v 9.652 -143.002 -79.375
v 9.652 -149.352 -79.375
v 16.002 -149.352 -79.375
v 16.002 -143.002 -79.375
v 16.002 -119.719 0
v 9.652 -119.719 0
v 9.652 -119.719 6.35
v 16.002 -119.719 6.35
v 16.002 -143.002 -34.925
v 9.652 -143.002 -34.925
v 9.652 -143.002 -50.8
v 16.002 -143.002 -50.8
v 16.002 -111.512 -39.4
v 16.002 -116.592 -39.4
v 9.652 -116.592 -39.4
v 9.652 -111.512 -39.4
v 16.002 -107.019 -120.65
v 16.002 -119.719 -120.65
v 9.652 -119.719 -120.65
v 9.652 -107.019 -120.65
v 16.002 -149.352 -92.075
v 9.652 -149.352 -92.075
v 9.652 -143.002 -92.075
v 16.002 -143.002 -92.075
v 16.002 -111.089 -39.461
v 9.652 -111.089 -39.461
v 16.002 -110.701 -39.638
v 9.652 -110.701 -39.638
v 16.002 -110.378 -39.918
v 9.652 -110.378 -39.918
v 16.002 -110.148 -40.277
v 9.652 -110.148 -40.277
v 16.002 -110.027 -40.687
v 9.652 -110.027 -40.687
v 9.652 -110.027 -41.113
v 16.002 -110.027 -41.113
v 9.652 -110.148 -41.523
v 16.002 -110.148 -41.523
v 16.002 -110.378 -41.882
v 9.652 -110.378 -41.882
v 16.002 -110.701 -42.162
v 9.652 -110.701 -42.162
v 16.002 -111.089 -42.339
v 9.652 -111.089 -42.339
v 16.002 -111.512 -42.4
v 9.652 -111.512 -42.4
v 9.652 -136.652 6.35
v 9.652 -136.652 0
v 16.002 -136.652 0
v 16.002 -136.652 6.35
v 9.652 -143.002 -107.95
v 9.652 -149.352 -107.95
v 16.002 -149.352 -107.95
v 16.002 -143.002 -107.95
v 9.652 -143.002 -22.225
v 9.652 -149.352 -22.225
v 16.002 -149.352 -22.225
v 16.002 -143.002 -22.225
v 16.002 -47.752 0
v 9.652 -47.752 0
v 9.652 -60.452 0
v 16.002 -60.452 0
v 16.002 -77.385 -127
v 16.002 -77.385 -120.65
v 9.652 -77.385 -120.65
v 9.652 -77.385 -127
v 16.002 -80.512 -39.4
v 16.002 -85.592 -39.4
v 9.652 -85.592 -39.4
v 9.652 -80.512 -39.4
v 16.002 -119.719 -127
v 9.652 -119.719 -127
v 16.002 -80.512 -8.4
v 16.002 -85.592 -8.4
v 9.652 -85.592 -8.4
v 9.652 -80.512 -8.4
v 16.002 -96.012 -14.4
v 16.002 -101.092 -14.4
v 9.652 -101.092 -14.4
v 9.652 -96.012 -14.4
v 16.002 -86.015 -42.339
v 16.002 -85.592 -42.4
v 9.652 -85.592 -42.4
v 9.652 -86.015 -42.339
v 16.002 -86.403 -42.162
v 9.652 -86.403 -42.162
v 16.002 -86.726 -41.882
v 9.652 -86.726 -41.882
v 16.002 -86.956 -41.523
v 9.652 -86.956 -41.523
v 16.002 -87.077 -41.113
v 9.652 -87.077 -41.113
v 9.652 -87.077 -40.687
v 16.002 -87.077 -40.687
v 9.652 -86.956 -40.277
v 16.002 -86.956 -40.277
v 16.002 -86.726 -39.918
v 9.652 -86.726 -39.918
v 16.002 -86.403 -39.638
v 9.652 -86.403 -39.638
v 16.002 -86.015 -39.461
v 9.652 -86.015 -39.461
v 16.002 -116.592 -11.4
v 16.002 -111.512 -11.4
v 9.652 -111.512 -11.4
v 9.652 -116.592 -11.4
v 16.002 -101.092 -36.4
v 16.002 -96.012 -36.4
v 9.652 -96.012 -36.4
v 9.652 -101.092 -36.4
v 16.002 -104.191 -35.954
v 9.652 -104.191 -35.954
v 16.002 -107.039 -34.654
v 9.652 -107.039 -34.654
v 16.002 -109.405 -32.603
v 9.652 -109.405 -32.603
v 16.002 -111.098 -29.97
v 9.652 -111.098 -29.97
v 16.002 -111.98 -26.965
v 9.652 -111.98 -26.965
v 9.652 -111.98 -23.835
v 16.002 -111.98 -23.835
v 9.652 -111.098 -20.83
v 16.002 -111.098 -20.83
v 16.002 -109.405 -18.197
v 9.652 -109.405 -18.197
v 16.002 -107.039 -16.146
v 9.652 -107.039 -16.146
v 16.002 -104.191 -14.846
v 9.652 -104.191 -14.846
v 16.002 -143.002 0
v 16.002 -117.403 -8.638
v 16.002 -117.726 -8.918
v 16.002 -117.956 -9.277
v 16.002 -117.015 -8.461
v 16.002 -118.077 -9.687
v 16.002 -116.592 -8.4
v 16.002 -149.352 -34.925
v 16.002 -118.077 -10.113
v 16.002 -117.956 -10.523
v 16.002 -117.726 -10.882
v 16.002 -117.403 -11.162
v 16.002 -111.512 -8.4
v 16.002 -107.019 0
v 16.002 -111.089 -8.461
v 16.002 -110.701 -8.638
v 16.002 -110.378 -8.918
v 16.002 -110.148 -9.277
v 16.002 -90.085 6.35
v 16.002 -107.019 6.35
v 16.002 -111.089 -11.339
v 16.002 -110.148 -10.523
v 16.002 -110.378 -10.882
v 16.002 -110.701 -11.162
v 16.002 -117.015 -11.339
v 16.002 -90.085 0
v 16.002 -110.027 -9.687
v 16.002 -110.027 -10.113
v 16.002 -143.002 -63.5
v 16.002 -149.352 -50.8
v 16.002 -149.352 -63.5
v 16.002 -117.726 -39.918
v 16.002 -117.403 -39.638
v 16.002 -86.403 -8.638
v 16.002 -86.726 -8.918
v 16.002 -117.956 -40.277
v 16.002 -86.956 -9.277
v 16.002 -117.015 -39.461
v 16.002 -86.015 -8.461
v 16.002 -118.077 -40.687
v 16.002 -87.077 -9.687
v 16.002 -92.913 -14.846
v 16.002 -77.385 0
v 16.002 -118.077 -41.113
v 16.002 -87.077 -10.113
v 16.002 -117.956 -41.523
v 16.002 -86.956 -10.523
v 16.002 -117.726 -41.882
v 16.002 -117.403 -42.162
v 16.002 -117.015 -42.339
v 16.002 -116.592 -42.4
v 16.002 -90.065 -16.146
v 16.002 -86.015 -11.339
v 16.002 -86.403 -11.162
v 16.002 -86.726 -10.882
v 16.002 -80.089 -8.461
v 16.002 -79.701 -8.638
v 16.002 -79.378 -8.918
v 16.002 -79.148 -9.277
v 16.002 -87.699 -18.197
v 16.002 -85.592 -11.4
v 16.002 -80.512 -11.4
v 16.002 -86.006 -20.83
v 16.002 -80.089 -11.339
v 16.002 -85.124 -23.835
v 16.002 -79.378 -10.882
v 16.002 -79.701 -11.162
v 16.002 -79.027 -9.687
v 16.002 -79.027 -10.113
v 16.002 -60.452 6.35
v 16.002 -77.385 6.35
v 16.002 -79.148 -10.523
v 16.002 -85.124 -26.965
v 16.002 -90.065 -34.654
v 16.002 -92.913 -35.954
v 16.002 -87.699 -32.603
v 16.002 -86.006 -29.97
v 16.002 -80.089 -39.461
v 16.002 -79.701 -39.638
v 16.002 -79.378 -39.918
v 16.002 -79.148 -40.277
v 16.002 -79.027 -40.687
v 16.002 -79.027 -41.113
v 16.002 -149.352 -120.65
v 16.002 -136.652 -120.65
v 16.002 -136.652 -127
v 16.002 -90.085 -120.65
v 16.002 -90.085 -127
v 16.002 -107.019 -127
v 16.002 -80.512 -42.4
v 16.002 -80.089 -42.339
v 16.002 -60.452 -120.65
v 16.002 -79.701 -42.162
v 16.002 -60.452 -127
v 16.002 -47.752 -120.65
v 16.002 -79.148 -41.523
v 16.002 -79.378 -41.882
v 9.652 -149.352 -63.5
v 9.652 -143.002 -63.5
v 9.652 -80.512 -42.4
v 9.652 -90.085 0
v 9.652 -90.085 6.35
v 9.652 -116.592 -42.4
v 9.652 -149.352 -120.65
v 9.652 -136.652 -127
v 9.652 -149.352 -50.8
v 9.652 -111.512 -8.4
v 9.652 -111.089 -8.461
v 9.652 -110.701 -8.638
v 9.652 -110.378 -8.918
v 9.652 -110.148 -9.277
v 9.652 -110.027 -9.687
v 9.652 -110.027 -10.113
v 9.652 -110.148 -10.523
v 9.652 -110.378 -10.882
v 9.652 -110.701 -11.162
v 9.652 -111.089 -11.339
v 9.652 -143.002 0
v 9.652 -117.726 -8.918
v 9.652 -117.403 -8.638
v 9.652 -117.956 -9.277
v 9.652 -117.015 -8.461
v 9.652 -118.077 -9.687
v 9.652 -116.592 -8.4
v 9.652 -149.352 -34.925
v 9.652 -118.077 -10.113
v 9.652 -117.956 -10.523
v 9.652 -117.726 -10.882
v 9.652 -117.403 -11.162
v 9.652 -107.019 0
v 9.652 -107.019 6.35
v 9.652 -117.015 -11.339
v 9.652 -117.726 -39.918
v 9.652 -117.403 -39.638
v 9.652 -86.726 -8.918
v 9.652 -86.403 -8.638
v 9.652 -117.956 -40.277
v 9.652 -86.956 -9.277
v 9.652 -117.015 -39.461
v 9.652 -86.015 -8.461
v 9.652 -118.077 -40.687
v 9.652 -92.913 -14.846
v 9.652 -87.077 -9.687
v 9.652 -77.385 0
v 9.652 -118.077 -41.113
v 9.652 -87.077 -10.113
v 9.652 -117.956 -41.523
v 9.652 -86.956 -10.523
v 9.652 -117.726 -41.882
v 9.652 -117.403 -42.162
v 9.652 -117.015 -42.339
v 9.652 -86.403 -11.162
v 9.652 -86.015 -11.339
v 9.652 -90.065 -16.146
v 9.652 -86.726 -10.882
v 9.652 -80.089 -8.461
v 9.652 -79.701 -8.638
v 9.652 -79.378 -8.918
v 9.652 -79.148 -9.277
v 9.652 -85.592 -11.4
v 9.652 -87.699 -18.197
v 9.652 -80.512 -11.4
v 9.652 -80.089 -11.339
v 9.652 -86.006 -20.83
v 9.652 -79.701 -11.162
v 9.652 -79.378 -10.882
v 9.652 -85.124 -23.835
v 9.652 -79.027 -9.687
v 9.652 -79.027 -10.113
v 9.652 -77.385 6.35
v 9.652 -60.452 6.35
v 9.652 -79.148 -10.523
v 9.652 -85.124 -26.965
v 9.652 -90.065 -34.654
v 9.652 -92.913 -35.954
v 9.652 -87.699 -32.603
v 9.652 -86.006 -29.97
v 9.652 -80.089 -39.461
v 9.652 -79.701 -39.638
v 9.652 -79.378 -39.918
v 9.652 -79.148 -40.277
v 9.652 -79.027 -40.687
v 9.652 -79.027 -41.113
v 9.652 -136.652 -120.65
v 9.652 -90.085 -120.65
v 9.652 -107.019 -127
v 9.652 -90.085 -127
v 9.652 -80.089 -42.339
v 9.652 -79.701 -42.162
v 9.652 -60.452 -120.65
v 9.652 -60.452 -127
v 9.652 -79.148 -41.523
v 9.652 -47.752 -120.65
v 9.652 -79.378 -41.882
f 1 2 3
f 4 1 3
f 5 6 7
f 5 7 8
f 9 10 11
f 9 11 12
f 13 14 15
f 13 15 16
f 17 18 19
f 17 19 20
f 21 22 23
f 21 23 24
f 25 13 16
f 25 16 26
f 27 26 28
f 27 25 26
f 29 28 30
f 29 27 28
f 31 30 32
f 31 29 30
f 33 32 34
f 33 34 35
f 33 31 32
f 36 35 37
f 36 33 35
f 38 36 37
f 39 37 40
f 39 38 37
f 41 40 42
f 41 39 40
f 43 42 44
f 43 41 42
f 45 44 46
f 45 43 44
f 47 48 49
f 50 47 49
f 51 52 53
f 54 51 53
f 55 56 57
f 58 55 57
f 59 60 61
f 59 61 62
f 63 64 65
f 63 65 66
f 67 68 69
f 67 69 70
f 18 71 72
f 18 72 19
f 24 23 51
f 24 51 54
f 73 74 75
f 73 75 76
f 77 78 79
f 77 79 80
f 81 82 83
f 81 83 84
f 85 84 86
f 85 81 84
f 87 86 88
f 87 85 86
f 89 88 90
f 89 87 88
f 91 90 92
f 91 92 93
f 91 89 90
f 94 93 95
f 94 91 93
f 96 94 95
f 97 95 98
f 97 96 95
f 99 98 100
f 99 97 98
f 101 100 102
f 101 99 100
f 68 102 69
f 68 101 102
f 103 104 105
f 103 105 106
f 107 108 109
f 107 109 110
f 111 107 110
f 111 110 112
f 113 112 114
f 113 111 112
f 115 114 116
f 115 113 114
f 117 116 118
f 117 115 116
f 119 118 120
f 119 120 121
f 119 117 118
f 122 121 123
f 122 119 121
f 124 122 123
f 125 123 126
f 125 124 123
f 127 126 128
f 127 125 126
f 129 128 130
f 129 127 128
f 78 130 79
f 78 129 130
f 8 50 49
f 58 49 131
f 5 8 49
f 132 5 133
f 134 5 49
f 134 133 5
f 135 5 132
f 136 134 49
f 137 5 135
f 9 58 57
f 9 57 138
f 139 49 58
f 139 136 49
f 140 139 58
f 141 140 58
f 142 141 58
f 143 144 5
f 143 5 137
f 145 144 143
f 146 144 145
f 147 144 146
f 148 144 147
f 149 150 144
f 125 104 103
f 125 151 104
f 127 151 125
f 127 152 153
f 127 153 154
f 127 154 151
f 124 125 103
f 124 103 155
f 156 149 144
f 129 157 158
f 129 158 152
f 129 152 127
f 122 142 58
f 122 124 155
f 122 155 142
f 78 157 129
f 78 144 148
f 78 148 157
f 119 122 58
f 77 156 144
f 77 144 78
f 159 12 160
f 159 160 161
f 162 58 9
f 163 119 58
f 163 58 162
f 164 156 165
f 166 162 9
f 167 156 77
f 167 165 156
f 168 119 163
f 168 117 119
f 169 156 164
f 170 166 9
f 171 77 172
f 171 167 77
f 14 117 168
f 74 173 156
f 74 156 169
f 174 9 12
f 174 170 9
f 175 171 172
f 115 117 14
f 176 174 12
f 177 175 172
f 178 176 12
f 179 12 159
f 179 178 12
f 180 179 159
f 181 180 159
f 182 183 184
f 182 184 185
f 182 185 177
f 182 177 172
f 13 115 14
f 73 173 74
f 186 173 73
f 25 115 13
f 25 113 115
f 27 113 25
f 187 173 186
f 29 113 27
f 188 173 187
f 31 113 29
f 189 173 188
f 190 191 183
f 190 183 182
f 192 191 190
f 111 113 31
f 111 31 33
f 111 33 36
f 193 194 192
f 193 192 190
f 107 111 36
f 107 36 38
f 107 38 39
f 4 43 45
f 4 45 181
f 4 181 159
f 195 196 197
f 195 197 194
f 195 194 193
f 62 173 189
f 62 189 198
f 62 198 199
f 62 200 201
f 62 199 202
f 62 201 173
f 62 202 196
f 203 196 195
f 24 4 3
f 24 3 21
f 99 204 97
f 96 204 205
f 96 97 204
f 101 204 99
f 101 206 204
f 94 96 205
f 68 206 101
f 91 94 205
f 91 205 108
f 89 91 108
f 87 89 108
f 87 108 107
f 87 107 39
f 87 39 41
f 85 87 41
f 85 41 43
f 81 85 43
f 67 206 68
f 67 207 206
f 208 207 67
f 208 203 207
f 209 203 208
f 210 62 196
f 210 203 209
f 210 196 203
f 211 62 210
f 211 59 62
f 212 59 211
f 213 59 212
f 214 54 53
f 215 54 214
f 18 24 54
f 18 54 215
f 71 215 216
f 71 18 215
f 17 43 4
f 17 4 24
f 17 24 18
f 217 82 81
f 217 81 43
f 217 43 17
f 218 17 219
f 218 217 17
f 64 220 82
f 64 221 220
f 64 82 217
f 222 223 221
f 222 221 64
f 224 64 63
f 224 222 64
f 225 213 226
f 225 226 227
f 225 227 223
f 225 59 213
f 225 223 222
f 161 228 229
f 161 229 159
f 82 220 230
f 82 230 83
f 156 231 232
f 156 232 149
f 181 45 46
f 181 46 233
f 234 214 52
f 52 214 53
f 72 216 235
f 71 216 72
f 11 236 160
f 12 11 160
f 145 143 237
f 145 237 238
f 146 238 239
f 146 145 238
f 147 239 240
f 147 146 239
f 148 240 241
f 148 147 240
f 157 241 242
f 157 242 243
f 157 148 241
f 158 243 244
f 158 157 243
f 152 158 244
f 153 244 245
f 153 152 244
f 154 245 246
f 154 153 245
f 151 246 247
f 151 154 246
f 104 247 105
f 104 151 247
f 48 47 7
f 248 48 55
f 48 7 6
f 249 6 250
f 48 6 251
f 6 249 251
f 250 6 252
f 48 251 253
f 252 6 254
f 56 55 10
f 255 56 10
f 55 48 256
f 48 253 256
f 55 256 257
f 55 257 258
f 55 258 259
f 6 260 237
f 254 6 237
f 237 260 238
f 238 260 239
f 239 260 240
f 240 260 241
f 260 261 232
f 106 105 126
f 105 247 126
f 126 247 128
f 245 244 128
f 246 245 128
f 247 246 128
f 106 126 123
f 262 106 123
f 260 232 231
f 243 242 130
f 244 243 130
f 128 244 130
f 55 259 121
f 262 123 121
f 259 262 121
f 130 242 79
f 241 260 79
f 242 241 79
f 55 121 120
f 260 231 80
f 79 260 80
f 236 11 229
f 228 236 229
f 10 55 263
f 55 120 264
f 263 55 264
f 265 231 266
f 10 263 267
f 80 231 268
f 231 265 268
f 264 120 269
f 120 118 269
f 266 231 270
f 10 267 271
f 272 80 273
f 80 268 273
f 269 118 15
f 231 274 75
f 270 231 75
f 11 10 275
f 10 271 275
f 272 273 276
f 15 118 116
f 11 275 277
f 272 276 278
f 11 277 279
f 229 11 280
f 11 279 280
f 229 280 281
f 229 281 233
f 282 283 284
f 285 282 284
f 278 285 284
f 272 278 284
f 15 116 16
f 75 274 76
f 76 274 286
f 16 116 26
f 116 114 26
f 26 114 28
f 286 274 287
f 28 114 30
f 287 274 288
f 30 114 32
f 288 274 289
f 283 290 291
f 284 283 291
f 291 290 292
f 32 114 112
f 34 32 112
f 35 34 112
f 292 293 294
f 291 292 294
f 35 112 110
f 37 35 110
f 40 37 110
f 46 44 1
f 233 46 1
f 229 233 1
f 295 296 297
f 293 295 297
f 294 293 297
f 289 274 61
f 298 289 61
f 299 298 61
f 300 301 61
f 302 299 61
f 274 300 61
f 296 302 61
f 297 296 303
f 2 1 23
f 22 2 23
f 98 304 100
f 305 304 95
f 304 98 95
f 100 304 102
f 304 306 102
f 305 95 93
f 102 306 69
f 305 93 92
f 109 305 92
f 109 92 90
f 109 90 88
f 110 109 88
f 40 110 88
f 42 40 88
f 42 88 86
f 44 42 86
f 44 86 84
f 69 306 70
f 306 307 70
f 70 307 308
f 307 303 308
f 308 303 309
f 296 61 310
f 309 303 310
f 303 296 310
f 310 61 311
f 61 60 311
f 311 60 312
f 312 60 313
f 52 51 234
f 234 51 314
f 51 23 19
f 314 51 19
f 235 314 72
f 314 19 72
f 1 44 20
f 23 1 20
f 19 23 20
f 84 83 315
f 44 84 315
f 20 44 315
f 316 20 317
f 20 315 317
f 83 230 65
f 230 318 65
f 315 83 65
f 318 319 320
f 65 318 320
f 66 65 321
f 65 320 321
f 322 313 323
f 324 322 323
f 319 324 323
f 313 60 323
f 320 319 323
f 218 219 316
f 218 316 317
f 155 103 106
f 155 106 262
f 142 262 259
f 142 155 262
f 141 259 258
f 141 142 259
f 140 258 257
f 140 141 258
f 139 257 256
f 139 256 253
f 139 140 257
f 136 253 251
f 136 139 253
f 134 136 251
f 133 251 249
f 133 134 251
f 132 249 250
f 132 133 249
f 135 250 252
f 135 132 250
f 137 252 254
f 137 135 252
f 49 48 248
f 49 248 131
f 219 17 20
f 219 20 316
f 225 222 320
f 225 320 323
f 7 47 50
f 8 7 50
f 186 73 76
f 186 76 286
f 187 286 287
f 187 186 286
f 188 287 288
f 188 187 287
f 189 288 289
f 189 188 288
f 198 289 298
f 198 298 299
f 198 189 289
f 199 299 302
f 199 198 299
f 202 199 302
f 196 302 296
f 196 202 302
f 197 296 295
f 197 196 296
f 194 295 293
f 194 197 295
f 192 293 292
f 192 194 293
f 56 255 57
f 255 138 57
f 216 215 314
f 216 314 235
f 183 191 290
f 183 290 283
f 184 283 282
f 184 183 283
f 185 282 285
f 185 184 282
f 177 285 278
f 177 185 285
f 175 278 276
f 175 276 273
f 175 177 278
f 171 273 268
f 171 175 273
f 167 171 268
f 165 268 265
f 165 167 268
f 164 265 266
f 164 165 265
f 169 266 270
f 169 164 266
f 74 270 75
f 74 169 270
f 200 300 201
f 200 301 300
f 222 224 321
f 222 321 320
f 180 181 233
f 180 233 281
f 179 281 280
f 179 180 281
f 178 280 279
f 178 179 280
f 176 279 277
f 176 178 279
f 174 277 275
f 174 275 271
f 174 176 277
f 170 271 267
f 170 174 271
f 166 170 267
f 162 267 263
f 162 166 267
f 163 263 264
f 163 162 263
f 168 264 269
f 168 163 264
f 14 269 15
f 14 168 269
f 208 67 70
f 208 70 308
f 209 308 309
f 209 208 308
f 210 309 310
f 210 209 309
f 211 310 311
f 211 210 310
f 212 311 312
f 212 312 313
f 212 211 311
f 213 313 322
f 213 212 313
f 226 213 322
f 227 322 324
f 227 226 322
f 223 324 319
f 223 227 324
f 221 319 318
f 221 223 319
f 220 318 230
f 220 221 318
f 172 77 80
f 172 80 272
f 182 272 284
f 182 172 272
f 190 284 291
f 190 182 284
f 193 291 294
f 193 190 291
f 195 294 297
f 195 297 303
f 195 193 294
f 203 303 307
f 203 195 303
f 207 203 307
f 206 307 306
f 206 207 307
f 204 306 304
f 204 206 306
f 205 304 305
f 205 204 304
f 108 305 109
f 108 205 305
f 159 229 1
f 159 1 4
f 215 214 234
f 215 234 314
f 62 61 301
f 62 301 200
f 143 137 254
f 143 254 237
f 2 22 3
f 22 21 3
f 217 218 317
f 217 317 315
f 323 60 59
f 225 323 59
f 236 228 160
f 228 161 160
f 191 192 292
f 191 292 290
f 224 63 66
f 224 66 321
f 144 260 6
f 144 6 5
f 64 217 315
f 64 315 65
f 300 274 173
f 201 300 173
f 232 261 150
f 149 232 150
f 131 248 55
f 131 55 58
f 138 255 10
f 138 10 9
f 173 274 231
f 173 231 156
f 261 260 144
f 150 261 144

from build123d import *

# Parameters (mm, degrees)
SKETCH1_W               = 44.958
SKETCH1_H               = 304.8
BOSS_EXTRUDE1_DEPTH     = 6.35
SKETCH2_W               = 6.35
SKETCH2_H               = 101.6
BOSS_EXTRUDE2_DEPTH     = 6.35
SKETCH3_W               = 120.65
SKETCH3_H               = 6.35
BOSS_EXTRUDE3_DEPTH     = 38.608
SKETCH8_W               = 6.35
SKETCH8_H               = 213.451350416
CUT_EXTRUDE4_DEPTH      = 1
CUT_EXTRUDE4_DEPTH_BACK = 134.35
SKETCH6_W               = 6.35
SKETCH6_H               = 12.7
CUT_EXTRUDE5_DEPTH      = 6.35
SKETCH4_3_W             = 6.35
SKETCH4_3_H             = 15.875
SKETCH4_3_H_2           = 6.35
CUT_EXTRUDE6_DEPTH      = 6.35


with BuildPart() as part:
    # Sketch1 → Boss-Extrude1 (new body)
    with BuildSketch(Plane.XY):
        with Locations((-6.477, 3.048)):
            Rectangle(SKETCH1_W, SKETCH1_H)
        with BuildLine():
            Line((-3.302, 133.858), (-3.302, -143.002))
            Line((-3.302, -143.002), (3.302, -143.002))
            Line((3.302, -143.002), (3.302, 143.002))
            Line((3.302, 143.002), (-16.256, 143.002))
            Line((-16.256, 143.002), (-16.256, 136.398))
            Line((-16.256, 136.398), (-5.842, 136.398))
            ThreePointArc((-5.842, 136.398), (-4.045948776, 135.654051224), (-3.302, 133.858))
        make_face(mode=Mode.SUBTRACT)
    extrude(amount=BOSS_EXTRUDE1_DEPTH)

    # Sketch2 → Boss-Extrude2 (add)
    with BuildSketch(Plane(origin=(16.002, 0, 0), x_dir=(0, 0, -1), z_dir=(1, 0, 0))):
        Polygon((120.65, -60.452), (120.65, -47.752), (0, -47.752), (0, -149.352), (120.65, -149.352), (120.65, -136.652), (127, -136.652), (127, -119.718666667), (120.65, -119.718666667), (120.65, -107.018666667), (127, -107.018666667), (127, -90.085333333), (120.65, -90.085333333), (120.65, -77.385333333), (127, -77.385333333), (127, -60.452), align=None)
        with BuildLine():
            ThreePointArc((11.4, -116.592), (9.9, -118.092), (8.4, -116.592))
            Line((8.4, -116.592), (8.4, -111.512))
            ThreePointArc((8.4, -111.512), (9.9, -110.012), (11.4, -111.512))
            Line((11.4, -111.512), (11.4, -116.592))
        make_face(mode=Mode.SUBTRACT)
        with BuildLine():
            Line((42.4, -111.512), (42.4, -116.592))
            ThreePointArc((42.4, -116.592), (40.9, -118.092), (39.4, -116.592))
            Line((39.4, -116.592), (39.4, -111.512))
            ThreePointArc((39.4, -111.512), (40.9, -110.012), (42.4, -111.512))
        make_face(mode=Mode.SUBTRACT)
        with BuildLine():
            ThreePointArc((36.4, -101.092), (25.4, -112.092), (14.4, -101.092))
            Line((14.4, -101.092), (14.4, -96.012))
            ThreePointArc((14.4, -96.012), (25.4, -85.012), (36.4, -96.012))
            Line((36.4, -96.012), (36.4, -101.092))
        make_face(mode=Mode.SUBTRACT)
        with BuildLine():
            ThreePointArc((11.4, -85.592), (9.9, -87.092), (8.4, -85.592))
            Line((8.4, -85.592), (8.4, -80.512))
            ThreePointArc((8.4, -80.512), (9.9, -79.012), (11.4, -80.512))
            Line((11.4, -80.512), (11.4, -85.592))
        make_face(mode=Mode.SUBTRACT)
        with BuildLine():
            ThreePointArc((42.4, -85.592), (40.9, -87.092), (39.4, -85.592))
            Line((39.4, -85.592), (39.4, -80.512))
            ThreePointArc((39.4, -80.512), (40.9, -79.012), (42.4, -80.512))
            Line((42.4, -80.512), (42.4, -85.592))
        make_face(mode=Mode.SUBTRACT)
        with Locations((-3.175, -98.552)):
            Rectangle(SKETCH2_W, SKETCH2_H)
    extrude(amount=-BOSS_EXTRUDE2_DEPTH)

    # Sketch3 → Boss-Extrude3 (add)
    with BuildSketch(Plane.ZY.offset(-9.652)):
        with Locations((-60.325, -146.177)):
            Rectangle(SKETCH3_W, SKETCH3_H)
    extrude(amount=BOSS_EXTRUDE3_DEPTH)

    # Sketch8 → Cut-Extrude4 (cut, two sides)
    with BuildSketch(Plane.XY.offset(6.35)) as cut_extrude4_sk:
        Polygon((-28.956, -149.352), (9.652, -149.352), (9.652, -47.752), (9.652, 155.448), (-28.956, 155.448), align=None)
        with BuildLine():
            Line((-16.256, 136.398), (-16.256, 143.002))
            Line((-16.256, 143.002), (3.302, 143.002))
            Line((3.302, 143.002), (3.302, -143.002))
            Line((3.302, -143.002), (-3.302, -143.002))
            Line((-3.302, -143.002), (-3.302, 133.858))
            ThreePointArc((-3.302, 133.858), (-4.045948776, 135.654051224), (-5.842, 136.398))
            Line((-5.842, 136.398), (-16.256, 136.398))
        make_face(mode=Mode.SUBTRACT)
        Polygon((-54.223542679, -149.352), (-28.956, -149.352), (-28.956, 155.448), (9.652, 155.448), (9.652, 165.699350416), (-54.223542679, 165.699350416), align=None)
        with Locations((12.827, 58.973675208)):
            Rectangle(SKETCH8_W, SKETCH8_H)
    extrude(amount=CUT_EXTRUDE4_DEPTH, mode=Mode.SUBTRACT)
    extrude(cut_extrude4_sk.sketch, amount=-CUT_EXTRUDE4_DEPTH_BACK, mode=Mode.SUBTRACT)

    # Sketch6 → Cut-Extrude5 (cut)
    with BuildSketch(Plane.XY.offset(6.35)):
        with Locations((12.827, -54.102)):
            Rectangle(SKETCH6_W, SKETCH6_H)
        with Locations((12.827, -83.735333333)):
            Rectangle(SKETCH6_W, SKETCH6_H)
        with Locations((12.827, -113.368666667)):
            Rectangle(SKETCH6_W, SKETCH6_H)
        with Locations((12.827, -143.002)):
            Rectangle(SKETCH6_W, SKETCH6_H)
    extrude(amount=-CUT_EXTRUDE5_DEPTH, mode=Mode.SUBTRACT)

    # Sketch4<3> → Cut-Extrude6 (cut)
    with BuildSketch(Plane.XZ.offset(149.352)):
        with Locations((12.827, -100.0125)):
            Rectangle(SKETCH4_3_W, SKETCH4_3_H)
        with Locations((12.827, -71.4375)):
            Rectangle(SKETCH4_3_W, SKETCH4_3_H)
        with Locations((12.827, -42.8625)):
            Rectangle(SKETCH4_3_W, SKETCH4_3_H)
        with Locations((12.827, -14.2875)):
            Rectangle(SKETCH4_3_W, SKETCH4_3_H)
        with Locations((12.827, 3.175)):
            Rectangle(SKETCH4_3_W, SKETCH4_3_H_2)
        with Locations((12.827, -3.175)):
            Rectangle(SKETCH4_3_W, SKETCH4_3_H_2)
    extrude(amount=-CUT_EXTRUDE6_DEPTH, mode=Mode.SUBTRACT)


solid = part.part
